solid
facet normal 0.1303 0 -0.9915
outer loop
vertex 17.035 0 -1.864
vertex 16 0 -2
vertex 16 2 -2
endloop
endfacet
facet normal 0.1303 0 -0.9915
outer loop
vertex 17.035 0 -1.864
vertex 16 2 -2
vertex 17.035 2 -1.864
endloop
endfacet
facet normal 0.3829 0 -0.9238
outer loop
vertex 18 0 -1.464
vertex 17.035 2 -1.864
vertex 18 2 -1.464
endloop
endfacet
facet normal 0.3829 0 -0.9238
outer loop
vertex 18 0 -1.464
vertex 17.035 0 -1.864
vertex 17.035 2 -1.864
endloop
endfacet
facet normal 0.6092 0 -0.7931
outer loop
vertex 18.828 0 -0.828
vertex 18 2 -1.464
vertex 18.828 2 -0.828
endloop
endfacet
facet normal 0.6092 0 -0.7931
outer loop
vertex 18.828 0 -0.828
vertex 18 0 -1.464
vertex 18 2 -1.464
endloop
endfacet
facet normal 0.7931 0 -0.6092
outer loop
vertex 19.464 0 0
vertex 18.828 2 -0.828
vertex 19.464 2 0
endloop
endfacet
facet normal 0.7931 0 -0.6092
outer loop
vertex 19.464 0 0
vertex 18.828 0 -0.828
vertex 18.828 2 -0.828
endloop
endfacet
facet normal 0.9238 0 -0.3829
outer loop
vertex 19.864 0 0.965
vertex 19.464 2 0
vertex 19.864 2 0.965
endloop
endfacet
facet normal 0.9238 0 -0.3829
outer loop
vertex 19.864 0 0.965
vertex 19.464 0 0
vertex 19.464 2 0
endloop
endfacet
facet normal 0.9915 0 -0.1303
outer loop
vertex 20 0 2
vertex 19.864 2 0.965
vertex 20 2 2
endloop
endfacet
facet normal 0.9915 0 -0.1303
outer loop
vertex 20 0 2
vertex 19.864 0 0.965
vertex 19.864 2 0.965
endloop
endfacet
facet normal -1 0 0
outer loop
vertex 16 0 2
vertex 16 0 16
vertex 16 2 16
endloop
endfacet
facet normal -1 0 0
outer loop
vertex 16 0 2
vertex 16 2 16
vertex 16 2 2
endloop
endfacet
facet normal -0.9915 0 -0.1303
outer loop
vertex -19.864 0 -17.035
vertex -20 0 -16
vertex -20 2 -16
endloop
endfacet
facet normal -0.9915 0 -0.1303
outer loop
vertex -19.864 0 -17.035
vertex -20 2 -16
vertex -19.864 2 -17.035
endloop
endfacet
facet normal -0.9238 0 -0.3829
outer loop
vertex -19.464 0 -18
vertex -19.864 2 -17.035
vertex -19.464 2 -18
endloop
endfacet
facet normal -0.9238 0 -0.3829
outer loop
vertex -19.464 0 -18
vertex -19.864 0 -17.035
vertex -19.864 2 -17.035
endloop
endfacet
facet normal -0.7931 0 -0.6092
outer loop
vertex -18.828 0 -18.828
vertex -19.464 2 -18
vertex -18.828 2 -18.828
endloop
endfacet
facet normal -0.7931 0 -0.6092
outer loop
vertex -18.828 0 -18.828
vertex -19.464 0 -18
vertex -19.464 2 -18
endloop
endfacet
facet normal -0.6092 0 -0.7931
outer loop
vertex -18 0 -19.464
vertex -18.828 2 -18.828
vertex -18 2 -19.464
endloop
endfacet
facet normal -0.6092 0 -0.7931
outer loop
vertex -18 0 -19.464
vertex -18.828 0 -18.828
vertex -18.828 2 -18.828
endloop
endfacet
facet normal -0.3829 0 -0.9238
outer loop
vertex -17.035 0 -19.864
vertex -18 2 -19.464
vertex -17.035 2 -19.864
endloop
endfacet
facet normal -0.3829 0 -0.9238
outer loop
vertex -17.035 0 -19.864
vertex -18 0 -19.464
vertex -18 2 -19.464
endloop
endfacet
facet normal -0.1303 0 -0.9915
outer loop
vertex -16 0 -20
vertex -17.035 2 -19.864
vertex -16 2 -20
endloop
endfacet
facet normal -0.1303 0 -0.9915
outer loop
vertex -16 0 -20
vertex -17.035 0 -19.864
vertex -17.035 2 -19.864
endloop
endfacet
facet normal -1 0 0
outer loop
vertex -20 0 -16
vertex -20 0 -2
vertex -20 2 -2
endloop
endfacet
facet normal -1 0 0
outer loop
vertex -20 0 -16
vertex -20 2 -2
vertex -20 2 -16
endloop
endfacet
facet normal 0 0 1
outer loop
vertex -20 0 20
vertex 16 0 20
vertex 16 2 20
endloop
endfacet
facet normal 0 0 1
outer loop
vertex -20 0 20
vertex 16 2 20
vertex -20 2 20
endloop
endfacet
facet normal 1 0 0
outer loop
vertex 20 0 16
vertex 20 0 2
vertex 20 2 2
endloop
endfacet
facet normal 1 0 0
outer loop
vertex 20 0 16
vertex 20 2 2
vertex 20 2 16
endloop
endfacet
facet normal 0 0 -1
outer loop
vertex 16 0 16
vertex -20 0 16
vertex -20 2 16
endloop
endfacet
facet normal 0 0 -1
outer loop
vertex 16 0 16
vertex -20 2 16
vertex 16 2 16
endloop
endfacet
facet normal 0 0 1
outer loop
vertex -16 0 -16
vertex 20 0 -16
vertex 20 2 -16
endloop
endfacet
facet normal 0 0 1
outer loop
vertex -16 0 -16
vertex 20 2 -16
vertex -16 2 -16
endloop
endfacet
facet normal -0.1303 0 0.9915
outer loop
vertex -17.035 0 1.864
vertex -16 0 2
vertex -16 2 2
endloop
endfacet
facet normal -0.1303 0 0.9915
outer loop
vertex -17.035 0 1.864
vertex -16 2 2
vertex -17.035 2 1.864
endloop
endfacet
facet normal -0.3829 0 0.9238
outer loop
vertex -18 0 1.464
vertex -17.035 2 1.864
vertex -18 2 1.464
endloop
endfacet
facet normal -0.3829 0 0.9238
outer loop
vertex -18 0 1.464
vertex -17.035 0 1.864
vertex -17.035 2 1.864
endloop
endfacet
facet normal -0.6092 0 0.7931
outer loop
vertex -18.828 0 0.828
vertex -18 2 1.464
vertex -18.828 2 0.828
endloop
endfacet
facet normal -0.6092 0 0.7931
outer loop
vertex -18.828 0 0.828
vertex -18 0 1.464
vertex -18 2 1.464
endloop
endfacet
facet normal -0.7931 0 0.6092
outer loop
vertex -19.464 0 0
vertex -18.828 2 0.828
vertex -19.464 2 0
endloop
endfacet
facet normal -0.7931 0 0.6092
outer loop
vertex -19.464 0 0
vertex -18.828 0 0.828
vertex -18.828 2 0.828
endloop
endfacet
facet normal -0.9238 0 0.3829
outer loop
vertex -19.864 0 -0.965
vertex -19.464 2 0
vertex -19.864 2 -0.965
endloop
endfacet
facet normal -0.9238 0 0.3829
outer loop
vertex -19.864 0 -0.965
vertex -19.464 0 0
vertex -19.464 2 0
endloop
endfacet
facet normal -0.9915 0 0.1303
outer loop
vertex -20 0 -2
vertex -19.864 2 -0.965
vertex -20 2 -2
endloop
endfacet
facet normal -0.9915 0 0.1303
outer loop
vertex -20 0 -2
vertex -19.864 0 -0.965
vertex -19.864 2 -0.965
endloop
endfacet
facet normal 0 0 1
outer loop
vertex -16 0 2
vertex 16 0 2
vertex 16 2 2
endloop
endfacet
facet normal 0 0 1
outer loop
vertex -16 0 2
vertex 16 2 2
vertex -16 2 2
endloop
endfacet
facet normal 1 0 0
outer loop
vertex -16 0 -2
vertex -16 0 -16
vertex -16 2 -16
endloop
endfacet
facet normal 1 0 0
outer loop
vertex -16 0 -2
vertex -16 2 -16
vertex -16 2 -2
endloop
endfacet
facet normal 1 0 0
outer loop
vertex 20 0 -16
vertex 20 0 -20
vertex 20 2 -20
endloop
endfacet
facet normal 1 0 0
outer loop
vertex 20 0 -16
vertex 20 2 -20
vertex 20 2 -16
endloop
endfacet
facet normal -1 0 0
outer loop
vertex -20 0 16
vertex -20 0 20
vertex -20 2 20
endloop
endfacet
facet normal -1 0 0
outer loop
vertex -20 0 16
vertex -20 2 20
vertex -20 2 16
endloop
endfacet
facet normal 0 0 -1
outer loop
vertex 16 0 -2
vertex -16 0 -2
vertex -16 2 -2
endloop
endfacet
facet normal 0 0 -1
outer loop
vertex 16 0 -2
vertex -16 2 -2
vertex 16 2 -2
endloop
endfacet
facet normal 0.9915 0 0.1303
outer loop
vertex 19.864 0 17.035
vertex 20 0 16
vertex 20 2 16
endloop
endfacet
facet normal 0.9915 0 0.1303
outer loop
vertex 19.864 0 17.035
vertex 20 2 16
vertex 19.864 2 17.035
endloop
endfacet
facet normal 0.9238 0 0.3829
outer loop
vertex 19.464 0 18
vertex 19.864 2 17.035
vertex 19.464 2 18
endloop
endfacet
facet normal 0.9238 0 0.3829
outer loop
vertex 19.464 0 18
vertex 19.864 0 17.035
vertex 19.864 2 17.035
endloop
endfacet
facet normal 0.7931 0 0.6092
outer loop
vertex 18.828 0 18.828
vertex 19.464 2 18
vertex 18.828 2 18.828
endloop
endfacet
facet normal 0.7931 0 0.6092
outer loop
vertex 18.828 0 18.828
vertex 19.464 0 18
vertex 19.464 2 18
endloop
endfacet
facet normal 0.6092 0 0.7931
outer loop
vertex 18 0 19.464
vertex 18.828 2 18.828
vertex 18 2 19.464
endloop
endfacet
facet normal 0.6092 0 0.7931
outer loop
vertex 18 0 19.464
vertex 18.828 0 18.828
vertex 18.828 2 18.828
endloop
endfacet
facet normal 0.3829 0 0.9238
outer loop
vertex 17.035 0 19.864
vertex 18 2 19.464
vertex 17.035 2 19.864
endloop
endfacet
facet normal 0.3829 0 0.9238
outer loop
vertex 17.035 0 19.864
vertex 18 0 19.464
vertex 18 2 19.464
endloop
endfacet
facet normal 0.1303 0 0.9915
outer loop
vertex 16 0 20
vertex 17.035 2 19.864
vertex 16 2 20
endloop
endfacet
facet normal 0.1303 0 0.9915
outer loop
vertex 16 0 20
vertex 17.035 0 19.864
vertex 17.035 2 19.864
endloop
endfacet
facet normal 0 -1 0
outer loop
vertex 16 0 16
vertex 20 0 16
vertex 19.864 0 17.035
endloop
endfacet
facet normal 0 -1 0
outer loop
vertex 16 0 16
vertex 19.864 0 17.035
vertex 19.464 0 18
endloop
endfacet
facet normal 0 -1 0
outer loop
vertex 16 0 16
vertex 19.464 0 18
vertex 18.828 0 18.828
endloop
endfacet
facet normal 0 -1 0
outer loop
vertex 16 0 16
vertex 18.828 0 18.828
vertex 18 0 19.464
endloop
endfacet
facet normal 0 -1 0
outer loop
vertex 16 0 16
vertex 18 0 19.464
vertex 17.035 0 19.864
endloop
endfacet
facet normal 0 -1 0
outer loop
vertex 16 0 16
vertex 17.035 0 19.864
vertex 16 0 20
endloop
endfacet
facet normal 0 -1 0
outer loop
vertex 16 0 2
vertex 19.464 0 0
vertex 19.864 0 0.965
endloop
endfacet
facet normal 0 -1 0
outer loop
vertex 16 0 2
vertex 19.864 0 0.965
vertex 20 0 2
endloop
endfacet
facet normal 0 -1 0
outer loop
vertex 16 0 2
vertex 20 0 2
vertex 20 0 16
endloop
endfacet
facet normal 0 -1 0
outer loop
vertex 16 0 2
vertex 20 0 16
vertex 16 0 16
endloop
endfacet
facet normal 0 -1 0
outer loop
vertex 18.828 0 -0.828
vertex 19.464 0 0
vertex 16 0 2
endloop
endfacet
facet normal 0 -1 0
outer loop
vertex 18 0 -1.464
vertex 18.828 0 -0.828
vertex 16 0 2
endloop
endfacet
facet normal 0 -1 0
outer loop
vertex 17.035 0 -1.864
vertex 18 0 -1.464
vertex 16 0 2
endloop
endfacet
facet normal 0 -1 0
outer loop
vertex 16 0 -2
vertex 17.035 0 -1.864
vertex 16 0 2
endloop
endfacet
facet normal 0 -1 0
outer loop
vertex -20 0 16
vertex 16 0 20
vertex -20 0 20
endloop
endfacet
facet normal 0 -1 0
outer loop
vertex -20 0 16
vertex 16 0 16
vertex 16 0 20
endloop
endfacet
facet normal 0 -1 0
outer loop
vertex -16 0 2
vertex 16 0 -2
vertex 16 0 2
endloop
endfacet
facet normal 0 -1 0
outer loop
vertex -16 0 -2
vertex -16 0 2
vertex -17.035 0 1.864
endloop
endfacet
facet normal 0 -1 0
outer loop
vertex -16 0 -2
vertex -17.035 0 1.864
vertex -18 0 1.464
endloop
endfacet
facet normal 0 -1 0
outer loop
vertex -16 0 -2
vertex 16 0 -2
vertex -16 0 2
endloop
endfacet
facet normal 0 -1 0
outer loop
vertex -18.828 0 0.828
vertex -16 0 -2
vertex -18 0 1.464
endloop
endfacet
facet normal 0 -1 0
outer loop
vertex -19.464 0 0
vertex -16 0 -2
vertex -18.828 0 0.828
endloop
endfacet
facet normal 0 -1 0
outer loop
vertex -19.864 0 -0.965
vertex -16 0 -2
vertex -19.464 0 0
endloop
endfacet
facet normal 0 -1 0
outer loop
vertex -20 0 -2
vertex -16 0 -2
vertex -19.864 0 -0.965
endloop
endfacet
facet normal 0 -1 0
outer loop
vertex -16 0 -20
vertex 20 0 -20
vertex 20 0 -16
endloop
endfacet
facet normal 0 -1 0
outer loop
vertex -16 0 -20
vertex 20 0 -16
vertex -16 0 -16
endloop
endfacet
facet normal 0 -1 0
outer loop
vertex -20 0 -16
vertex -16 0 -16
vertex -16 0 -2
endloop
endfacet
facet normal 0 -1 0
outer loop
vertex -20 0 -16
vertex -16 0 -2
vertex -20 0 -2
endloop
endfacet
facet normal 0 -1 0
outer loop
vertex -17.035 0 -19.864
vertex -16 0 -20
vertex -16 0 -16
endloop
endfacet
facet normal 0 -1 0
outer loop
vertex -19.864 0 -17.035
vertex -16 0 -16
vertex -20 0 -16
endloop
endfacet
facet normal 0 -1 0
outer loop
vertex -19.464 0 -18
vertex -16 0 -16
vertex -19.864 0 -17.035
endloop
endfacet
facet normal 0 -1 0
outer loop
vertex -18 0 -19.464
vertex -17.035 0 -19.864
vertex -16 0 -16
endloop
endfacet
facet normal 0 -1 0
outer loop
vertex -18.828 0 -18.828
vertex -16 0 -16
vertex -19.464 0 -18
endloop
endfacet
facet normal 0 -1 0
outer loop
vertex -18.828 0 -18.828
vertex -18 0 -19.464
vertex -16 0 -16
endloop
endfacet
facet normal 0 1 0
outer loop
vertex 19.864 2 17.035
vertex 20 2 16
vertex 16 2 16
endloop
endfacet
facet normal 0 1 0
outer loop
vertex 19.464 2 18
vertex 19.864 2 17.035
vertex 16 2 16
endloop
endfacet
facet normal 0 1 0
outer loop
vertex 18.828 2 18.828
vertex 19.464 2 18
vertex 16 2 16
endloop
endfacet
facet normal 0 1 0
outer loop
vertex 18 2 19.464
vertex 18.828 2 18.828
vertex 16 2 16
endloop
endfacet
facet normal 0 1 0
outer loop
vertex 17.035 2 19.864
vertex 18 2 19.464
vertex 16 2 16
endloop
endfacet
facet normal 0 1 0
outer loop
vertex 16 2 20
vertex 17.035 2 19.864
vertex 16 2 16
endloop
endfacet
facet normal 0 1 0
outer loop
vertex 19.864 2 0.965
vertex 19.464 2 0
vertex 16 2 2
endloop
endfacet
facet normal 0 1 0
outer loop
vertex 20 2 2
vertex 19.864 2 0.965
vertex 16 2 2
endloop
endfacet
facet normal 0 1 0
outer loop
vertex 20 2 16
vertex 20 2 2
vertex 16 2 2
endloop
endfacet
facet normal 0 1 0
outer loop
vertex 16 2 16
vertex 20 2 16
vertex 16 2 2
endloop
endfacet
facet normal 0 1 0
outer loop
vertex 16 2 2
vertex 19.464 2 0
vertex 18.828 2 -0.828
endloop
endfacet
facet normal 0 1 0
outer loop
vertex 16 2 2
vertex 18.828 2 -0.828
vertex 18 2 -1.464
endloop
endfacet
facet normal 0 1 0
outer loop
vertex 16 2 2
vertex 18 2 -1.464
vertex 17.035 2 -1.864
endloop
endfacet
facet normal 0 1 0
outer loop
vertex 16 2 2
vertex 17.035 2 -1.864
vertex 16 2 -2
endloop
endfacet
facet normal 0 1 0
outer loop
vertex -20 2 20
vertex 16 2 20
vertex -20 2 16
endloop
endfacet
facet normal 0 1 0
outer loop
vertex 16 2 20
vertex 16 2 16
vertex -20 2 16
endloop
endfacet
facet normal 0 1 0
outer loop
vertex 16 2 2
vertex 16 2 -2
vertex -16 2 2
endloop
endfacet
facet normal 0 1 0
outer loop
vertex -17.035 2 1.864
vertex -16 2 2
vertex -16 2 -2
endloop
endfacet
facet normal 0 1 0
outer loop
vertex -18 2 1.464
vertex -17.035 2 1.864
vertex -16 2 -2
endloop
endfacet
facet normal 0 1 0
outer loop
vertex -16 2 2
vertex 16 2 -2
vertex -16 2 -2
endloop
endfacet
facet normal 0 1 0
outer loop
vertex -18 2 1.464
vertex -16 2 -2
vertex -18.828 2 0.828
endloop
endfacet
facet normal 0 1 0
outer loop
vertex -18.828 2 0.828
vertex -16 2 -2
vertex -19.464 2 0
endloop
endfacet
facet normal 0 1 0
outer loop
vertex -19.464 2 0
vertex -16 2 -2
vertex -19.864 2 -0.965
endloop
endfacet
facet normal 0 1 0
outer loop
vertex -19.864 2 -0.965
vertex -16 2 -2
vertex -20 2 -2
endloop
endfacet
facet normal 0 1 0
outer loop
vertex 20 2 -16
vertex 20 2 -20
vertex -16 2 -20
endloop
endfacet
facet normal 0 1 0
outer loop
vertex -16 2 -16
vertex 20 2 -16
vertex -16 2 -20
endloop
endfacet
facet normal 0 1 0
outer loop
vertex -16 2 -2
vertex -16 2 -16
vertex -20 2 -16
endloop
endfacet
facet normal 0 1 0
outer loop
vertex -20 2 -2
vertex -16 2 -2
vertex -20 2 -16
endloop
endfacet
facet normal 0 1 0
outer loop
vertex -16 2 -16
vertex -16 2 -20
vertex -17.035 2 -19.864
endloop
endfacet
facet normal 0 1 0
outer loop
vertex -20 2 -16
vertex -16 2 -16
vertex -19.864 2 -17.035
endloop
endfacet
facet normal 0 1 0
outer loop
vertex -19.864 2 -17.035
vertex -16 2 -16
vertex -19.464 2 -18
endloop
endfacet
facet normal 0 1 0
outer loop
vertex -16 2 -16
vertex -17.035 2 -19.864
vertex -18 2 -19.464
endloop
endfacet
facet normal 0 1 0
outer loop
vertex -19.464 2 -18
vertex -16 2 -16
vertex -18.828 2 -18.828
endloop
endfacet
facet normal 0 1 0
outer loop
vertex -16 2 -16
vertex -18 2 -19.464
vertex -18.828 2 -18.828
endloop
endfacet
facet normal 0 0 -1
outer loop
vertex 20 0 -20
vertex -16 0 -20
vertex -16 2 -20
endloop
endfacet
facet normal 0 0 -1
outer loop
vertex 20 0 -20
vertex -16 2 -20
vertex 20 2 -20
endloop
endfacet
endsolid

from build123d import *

# Parameters (mm, degrees)
BOSS_EXTRUDE1_DEPTH = 2


with BuildPart() as part:
    # Sketch2 → Boss-Extrude1 (new body)
    with BuildSketch(Plane(origin=(0, 0, 0), x_dir=(1, 0, 0), z_dir=(0, 1, 0))):
        with BuildLine():
            Line((20, 20), (20, 16))
            Line((20, 16), (-16, 16))
            Line((-16, 16), (-16, 2))
            Line((-16, 2), (16, 2))
            ThreePointArc((16, 2), (18.828427125, 0.828427125), (20, -2))
            Line((20, -2), (20, -16))
            ThreePointArc((20, -16), (18.828427125, -18.828427125), (16, -20))
            Line((16, -20), (-20, -20))
            Line((-20, -20), (-20, -16))
            Line((-20, -16), (16, -16))
            Line((16, -16), (16, -2))
            Line((16, -2), (-16, -2))
            ThreePointArc((-16, -2), (-18.828427125, -0.828427125), (-20, 2))
            Line((-20, 2), (-20, 16))
            ThreePointArc((-20, 16), (-18.828427125, 18.828427125), (-16, 20))
            Line((-16, 20), (20, 20))
        make_face()
    extrude(amount=BOSS_EXTRUDE1_DEPTH)


solid = part.part
